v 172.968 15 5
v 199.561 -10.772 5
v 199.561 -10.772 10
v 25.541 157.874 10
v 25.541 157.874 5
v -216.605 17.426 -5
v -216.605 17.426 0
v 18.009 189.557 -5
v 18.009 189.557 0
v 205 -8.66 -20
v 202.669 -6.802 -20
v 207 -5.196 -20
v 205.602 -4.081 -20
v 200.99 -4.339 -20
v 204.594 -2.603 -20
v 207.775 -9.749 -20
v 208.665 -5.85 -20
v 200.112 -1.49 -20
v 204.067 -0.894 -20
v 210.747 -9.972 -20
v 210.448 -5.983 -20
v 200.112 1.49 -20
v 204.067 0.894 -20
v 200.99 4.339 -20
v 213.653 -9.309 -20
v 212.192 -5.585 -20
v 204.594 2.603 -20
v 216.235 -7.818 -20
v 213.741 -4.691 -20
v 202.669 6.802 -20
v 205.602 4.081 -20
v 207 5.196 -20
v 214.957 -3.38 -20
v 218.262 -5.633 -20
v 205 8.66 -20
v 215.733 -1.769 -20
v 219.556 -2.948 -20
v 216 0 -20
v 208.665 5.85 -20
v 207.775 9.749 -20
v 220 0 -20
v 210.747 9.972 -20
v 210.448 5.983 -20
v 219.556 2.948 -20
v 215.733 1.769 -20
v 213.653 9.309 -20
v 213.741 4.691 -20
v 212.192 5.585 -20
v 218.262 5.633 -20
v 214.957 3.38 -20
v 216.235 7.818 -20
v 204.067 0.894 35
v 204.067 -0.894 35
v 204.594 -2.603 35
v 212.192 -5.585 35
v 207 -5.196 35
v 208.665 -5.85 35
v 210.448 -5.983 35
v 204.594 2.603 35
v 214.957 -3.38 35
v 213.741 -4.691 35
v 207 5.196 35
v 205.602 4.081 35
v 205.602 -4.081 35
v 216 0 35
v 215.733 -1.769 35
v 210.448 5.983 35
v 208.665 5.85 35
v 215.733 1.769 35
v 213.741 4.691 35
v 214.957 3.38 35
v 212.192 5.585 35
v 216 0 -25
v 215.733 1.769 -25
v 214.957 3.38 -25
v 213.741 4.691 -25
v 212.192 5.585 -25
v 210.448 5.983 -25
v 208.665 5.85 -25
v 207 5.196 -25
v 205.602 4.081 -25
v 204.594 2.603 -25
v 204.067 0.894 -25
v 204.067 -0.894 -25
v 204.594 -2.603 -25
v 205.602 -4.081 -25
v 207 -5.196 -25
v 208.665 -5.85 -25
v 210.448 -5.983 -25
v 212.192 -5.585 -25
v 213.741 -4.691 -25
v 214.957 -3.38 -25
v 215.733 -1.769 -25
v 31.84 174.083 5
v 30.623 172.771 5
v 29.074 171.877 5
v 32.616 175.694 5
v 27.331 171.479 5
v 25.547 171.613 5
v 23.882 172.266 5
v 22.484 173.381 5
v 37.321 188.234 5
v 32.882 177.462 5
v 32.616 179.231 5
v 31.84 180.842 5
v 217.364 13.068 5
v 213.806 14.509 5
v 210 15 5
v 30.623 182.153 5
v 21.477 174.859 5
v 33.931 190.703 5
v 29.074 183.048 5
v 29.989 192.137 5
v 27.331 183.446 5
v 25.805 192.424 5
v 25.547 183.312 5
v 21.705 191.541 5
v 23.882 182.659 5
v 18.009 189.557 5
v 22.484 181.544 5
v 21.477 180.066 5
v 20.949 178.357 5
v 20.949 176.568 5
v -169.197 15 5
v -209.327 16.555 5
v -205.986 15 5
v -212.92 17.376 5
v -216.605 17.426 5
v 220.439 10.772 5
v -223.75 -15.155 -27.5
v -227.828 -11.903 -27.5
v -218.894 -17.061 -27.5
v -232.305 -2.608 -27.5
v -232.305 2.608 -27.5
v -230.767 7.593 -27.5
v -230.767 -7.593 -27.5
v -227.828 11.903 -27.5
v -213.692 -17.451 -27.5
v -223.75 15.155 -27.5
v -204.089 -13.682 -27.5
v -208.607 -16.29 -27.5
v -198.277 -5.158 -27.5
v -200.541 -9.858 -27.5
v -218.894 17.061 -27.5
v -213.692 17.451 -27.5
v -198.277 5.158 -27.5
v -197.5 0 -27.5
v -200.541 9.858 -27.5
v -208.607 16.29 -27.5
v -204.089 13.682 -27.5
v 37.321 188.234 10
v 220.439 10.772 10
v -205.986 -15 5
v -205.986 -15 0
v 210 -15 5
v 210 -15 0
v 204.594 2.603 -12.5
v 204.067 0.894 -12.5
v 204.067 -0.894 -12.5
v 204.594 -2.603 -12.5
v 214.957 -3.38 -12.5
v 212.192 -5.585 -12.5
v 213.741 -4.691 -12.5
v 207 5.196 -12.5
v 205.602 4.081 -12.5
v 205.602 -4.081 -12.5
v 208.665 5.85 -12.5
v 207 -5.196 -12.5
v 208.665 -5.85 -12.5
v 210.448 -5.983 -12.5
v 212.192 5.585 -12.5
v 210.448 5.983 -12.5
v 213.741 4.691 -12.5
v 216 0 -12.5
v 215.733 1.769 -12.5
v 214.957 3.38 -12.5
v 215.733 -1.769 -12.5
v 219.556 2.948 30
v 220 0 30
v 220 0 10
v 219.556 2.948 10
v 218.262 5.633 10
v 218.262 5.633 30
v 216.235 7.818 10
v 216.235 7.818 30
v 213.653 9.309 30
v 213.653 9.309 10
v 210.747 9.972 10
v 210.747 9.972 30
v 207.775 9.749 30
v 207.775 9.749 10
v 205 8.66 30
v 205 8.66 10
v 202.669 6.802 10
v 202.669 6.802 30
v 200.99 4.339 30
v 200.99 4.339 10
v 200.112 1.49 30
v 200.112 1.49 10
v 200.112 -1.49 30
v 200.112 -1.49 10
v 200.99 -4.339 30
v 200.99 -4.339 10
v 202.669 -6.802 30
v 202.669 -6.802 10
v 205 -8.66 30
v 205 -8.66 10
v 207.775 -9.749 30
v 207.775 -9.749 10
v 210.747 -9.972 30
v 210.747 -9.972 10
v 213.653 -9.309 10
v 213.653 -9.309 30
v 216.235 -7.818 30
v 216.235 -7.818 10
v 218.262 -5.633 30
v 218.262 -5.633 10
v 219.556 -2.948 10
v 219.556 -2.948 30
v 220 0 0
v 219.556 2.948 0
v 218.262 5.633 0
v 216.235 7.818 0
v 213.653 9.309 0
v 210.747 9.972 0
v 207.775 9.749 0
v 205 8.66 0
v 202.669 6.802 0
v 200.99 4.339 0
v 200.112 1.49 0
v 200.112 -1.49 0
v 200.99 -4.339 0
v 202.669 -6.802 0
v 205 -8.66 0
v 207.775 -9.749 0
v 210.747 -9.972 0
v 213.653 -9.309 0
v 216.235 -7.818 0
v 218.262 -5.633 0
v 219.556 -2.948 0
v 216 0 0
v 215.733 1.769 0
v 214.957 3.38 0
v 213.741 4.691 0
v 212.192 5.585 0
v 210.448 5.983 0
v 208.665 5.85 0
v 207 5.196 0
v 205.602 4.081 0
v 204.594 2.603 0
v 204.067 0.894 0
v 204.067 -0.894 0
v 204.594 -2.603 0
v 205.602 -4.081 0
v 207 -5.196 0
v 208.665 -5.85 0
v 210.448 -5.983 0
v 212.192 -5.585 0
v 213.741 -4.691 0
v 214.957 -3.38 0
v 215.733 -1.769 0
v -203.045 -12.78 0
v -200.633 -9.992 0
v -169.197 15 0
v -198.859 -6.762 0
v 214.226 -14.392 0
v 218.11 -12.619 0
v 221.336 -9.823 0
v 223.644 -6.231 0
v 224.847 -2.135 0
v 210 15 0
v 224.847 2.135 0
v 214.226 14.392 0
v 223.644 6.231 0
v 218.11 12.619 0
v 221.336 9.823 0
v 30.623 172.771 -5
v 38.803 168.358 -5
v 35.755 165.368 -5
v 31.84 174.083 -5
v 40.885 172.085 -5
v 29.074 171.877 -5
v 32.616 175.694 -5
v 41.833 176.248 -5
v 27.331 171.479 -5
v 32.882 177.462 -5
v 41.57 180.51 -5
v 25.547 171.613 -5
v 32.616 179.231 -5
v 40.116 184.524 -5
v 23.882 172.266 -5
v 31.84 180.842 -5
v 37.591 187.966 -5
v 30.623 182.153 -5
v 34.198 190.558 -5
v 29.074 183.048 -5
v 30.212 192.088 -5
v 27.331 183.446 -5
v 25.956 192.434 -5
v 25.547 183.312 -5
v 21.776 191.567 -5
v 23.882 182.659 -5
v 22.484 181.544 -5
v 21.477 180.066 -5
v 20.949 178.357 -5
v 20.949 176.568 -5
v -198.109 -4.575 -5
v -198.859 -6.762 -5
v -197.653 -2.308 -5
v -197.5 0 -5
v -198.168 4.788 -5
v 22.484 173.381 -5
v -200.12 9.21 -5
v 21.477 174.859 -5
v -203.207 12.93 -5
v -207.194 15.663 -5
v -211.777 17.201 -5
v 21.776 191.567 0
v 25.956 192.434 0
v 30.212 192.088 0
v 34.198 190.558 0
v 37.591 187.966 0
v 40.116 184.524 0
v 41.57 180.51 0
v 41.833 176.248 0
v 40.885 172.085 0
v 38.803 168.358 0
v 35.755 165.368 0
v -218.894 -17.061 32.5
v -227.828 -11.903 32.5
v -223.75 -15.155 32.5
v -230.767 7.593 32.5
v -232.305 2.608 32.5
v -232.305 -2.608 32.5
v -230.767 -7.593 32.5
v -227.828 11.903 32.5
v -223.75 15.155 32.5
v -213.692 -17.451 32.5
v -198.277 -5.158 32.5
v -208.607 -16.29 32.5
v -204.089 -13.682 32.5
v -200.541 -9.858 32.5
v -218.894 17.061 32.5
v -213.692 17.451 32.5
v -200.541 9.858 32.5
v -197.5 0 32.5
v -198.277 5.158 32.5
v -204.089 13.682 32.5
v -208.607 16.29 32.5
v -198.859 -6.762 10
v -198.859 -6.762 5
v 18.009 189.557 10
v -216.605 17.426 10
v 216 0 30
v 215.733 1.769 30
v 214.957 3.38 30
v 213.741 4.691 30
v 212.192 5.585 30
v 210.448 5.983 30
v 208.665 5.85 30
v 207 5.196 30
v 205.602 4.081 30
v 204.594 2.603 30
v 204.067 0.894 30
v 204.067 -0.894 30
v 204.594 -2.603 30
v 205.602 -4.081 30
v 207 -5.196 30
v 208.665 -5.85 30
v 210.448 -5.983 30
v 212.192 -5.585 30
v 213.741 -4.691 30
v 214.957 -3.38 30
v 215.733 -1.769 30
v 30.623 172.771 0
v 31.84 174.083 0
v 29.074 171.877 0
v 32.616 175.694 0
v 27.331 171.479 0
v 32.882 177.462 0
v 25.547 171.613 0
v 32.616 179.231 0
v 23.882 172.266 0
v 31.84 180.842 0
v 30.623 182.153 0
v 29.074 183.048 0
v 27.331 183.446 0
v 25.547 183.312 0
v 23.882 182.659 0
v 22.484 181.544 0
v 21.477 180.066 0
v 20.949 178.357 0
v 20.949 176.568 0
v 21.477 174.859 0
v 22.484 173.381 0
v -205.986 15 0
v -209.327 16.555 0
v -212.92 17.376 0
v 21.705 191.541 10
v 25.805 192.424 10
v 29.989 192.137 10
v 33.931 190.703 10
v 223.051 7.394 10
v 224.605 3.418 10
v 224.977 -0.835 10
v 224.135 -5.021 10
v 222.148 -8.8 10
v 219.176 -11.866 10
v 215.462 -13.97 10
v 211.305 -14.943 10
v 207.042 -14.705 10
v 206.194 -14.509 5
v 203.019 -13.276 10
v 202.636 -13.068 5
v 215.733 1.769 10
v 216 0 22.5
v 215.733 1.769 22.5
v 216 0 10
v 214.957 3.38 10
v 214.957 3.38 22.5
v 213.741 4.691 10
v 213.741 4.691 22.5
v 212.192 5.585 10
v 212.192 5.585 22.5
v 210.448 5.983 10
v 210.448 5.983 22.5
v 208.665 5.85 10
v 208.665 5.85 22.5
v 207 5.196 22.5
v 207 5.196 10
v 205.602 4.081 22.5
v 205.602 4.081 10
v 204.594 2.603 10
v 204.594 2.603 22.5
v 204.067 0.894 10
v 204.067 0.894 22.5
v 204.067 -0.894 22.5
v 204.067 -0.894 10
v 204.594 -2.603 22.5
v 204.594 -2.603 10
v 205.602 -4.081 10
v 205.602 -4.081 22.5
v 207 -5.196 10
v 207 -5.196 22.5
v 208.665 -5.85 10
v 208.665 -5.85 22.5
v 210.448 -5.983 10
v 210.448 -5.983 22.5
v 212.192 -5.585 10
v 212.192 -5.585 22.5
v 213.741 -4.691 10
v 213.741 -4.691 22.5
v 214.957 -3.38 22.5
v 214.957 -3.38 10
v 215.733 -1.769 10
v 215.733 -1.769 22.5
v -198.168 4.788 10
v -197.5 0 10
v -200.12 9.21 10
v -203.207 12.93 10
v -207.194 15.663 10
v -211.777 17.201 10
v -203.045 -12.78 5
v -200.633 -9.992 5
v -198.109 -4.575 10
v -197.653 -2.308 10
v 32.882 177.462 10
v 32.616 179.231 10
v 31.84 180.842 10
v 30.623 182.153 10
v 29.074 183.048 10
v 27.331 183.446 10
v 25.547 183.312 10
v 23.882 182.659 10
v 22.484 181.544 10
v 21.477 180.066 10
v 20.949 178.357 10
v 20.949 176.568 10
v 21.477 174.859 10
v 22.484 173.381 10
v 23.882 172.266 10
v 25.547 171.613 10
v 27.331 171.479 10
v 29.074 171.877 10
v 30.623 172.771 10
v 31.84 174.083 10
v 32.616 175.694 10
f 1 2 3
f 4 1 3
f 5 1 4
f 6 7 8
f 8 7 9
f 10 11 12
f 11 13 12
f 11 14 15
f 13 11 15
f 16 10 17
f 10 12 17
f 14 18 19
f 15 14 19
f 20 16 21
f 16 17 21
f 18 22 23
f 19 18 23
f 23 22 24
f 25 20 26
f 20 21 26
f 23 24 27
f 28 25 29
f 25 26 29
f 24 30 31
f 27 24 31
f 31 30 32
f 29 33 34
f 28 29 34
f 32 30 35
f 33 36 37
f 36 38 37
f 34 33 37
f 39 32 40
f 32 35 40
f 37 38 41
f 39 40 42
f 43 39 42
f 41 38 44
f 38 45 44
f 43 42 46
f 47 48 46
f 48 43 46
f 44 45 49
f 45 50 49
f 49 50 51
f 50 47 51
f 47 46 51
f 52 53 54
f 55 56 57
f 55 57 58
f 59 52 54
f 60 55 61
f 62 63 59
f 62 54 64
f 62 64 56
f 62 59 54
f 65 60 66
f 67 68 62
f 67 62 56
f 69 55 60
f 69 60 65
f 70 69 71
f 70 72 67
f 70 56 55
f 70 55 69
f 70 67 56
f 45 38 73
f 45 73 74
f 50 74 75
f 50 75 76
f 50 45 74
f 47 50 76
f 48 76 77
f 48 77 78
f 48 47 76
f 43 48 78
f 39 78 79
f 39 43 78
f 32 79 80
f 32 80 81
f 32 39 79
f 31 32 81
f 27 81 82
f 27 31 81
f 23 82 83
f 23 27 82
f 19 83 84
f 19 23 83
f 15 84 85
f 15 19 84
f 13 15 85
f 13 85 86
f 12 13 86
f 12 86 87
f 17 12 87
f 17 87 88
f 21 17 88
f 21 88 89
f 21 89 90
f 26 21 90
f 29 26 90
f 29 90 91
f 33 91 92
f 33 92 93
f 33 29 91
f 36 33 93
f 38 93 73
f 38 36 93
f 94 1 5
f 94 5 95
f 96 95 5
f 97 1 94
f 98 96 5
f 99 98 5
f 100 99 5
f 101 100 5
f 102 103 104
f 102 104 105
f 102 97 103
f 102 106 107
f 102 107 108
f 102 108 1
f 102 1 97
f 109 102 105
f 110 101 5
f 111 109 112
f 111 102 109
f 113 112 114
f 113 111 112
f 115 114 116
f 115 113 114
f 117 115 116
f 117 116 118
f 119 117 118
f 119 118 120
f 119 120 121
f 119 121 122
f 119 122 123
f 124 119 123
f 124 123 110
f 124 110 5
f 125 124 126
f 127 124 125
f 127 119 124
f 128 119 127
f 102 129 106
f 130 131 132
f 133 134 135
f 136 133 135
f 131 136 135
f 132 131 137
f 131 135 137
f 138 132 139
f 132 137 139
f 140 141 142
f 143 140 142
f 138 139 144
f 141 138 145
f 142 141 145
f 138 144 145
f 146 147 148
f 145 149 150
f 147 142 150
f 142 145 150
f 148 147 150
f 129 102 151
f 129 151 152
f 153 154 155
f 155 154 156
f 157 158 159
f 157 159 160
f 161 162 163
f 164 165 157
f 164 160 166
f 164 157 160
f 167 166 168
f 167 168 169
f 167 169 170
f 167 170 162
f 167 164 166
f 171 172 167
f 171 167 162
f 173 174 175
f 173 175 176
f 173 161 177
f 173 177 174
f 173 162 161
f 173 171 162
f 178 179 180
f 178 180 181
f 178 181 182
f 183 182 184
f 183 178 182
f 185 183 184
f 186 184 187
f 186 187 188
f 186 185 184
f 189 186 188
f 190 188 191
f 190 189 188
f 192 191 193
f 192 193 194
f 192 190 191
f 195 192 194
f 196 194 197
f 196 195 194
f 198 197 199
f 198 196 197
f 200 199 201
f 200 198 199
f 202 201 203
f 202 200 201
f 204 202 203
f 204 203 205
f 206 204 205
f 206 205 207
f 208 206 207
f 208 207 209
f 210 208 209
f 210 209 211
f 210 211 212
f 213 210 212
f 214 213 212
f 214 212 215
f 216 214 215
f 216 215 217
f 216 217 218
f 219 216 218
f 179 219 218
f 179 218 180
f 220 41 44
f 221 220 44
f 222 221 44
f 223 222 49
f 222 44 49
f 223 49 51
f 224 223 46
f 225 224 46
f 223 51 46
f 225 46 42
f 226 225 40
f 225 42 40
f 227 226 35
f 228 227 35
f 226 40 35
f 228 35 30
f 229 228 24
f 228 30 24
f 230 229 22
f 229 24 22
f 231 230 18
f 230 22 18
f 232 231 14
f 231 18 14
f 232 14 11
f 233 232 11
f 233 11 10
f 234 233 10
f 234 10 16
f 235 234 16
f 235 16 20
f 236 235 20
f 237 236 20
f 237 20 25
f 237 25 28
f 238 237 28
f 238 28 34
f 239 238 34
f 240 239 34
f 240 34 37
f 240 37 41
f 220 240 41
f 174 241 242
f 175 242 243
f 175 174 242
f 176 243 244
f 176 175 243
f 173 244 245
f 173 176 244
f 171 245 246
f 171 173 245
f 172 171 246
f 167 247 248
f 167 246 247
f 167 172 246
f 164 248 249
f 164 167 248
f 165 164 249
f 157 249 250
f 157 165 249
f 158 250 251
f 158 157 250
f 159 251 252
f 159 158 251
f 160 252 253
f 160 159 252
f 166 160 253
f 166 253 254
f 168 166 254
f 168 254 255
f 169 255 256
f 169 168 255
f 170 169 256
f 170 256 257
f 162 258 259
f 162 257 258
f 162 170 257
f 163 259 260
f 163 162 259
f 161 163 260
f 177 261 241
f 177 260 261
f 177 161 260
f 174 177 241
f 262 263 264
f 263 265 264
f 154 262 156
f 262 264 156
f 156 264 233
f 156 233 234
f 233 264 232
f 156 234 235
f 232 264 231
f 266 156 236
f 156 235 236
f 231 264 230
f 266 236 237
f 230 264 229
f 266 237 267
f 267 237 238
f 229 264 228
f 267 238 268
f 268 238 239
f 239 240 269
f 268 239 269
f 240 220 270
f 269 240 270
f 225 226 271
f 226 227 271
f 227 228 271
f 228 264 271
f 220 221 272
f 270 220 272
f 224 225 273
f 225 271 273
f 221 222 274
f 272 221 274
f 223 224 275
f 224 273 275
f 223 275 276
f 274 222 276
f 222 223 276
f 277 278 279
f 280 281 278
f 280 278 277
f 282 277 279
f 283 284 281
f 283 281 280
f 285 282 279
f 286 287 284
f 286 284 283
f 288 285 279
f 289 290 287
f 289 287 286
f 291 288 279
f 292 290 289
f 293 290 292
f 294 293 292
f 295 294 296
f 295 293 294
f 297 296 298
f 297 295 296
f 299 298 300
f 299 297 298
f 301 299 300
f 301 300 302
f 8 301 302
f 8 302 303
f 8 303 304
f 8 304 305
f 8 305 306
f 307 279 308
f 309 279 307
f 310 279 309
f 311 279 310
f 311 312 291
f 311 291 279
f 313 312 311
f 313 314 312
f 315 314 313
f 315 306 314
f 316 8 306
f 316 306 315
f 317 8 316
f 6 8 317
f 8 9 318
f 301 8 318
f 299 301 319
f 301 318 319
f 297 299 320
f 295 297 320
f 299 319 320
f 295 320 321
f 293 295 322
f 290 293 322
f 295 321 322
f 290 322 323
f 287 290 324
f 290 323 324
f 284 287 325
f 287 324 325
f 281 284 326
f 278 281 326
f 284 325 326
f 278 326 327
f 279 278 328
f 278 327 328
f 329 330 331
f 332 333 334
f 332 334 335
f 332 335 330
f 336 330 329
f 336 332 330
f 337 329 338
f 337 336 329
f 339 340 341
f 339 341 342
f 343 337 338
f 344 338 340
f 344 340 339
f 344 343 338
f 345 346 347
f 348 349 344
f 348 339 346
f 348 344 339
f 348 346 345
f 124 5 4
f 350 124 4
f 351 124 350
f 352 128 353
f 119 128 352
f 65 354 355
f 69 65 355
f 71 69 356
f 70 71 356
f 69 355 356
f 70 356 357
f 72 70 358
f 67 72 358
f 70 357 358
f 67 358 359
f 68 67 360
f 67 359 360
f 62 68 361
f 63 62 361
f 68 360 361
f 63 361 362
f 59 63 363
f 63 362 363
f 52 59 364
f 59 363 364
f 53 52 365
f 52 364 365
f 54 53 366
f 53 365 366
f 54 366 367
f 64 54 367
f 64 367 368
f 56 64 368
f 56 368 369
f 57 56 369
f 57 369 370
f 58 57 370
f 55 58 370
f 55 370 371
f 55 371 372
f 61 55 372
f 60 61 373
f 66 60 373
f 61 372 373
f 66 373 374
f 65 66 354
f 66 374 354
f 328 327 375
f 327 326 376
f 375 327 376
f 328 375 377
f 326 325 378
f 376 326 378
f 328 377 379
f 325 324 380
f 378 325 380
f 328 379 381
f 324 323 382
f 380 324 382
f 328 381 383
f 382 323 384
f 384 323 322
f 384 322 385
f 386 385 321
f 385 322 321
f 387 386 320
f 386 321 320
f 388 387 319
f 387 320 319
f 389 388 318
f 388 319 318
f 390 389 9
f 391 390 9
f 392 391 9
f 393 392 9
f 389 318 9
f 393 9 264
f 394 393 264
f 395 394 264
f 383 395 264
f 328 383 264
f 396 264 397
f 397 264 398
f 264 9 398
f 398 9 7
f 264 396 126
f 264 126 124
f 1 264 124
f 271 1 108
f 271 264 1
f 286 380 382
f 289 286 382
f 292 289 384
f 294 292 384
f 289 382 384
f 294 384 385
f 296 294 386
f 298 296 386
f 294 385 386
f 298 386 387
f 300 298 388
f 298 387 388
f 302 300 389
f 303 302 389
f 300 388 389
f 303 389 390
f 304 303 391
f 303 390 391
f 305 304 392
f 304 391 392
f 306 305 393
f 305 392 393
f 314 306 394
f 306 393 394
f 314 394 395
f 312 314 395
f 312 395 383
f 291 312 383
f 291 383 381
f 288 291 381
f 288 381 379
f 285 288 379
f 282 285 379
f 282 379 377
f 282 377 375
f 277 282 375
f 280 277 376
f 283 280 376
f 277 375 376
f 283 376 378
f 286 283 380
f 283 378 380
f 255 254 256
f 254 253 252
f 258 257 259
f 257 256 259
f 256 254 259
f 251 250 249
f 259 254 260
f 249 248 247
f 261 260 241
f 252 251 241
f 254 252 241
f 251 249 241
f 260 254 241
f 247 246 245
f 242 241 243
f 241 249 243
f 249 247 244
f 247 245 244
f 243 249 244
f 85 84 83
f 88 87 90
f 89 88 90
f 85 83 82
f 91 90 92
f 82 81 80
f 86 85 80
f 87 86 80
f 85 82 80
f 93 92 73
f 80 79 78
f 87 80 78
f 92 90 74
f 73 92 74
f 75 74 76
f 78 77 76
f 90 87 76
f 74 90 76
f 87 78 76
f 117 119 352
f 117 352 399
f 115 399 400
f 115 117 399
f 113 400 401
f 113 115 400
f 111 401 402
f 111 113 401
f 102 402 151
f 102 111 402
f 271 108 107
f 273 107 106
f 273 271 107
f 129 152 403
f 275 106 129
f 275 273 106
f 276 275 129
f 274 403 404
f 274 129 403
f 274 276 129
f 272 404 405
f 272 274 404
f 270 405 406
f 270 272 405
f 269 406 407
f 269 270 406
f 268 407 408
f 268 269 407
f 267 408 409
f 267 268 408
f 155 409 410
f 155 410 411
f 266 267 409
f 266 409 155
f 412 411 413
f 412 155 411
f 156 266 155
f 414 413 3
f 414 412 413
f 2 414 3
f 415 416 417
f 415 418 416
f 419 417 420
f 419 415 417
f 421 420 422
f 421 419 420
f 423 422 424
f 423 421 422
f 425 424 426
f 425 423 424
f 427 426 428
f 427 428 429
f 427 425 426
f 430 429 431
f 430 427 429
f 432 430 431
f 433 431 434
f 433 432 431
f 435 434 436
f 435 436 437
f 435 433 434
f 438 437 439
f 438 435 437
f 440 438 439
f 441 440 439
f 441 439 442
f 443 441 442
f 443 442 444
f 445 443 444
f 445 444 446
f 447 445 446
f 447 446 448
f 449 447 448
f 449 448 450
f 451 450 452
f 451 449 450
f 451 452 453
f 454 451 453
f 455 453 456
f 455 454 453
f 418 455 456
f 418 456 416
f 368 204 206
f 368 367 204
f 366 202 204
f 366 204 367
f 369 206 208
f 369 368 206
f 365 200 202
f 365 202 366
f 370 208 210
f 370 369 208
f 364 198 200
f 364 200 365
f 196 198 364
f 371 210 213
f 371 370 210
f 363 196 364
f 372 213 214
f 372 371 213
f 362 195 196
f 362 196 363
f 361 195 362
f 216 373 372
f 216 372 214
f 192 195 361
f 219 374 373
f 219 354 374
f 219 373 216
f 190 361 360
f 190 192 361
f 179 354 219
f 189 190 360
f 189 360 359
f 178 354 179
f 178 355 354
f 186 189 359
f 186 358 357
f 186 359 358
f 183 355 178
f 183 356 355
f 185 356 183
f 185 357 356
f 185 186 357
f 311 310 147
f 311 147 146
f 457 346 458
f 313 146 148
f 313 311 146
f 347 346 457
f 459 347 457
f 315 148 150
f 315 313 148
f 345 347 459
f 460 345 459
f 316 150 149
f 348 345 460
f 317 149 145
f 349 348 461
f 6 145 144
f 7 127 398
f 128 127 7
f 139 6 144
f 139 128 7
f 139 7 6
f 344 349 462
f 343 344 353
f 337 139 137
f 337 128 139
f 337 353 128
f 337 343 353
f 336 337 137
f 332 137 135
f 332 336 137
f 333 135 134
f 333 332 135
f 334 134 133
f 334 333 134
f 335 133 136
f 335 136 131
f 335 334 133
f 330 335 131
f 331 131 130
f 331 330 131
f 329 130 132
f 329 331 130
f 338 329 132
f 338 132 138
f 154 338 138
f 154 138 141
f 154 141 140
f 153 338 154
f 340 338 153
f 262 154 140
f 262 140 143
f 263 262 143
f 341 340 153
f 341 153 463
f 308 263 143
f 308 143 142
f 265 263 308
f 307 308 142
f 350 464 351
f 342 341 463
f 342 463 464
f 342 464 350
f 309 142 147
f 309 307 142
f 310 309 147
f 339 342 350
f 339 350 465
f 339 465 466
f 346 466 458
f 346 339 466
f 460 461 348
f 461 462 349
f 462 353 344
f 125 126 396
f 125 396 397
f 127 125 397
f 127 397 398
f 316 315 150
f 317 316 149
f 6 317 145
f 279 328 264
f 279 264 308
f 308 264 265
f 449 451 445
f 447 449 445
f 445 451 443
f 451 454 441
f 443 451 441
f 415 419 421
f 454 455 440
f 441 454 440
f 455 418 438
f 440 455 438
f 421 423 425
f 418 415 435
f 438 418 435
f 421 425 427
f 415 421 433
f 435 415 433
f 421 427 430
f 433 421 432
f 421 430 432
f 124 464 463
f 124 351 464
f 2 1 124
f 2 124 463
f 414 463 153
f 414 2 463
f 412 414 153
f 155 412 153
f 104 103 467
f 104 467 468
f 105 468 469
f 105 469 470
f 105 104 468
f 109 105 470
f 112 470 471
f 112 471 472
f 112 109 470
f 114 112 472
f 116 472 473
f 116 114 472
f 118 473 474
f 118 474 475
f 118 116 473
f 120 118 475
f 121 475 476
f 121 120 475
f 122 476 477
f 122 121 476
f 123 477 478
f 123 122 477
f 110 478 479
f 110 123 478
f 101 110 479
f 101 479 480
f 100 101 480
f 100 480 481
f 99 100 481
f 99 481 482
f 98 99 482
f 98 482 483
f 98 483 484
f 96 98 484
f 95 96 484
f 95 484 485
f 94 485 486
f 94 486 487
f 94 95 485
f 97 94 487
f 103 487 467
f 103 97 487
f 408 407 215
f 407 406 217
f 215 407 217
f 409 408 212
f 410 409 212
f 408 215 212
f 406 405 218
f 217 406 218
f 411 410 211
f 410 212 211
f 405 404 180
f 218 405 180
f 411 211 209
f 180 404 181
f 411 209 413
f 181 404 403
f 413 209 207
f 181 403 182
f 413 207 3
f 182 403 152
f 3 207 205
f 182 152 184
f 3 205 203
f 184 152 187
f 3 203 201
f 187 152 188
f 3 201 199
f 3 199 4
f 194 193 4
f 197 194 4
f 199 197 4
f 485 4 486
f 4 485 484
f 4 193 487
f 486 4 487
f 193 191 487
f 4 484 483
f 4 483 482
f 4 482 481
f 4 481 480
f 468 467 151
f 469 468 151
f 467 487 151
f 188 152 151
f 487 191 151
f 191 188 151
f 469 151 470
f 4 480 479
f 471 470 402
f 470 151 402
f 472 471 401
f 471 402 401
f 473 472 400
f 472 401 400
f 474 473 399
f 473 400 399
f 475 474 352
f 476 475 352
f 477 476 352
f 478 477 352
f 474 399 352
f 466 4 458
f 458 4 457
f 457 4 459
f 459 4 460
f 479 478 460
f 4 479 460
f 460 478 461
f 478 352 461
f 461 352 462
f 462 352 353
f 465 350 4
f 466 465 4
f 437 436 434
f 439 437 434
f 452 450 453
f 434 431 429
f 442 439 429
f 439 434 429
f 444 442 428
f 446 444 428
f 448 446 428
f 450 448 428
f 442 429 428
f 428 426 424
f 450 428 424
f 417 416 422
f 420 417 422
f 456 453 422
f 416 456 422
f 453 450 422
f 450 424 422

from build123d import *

# Parameters (mm, degrees)
SKETCH_1_W      = 450
SKETCH_1_H      = 30
EXTRUDE_1_DEPTH = 5
FILLET_1_RADIUS = 15
FILLET_1_LENGTH = 5
FILLET_2_RADIUS = 15
FILLET_2_LENGTH = 5
SKETCH_2_R      = 10
SKETCH_2_R_2    = 6
EXTRUDE_2_DEPTH = 17.5
SKETCH_4_R      = 6
EXTRUDE_3_DEPTH = 5
SKETCH_5_R      = 6
EXTRUDE_4_DEPTH = 5
EXTRUDE_START   = 7.5
SKETCH_6_R      = 10
EXTRUDE_5_DEPTH = 7.5
SKETCH_7_R      = 6
EXTRUDE_6_DEPTH = 5
SKETCH_8_R      = 17.5
EXTRUDE_7_DEPTH = 30


with BuildPart() as part:
    # 草图1 → 凸台-拉伸1 (new body)
    with BuildSketch(Plane.XY):
        Rectangle(SKETCH_1_W, SKETCH_1_H)
    extrude(amount=EXTRUDE_1_DEPTH)

    # 圆角1: full round fillet: the end face becomes a half cylinder, R = half its width
    fillet_1_face = Plane((-225, 0, 2.5), x_dir=(0, 0, 1), z_dir=(-1, 0, 0))  # on the end face: x along it, z out of the body
    fillet_1_slab = fillet_1_face.offset(-FILLET_1_RADIUS / 2) * Box(FILLET_1_LENGTH, 2 * FILLET_1_RADIUS, FILLET_1_RADIUS, mode=Mode.PRIVATE)  # the body's end, R deep
    fillet_1_round = Plane((-210, 0, 2.5), x_dir=(-1, 0, 0), z_dir=(0, 0, 1)) * Cylinder(FILLET_1_RADIUS, FILLET_1_LENGTH, mode=Mode.PRIVATE)  # its axis R under the face
    add(fillet_1_slab - fillet_1_round, mode=Mode.SUBTRACT)

    # 圆角2: full round fillet: the end face becomes a half cylinder, R = half its width
    fillet_2_face = Plane((225, 0, 2.5), x_dir=(0, 0, -1), z_dir=(1, 0, 0))  # on the end face: x along it, z out of the body
    fillet_2_slab = fillet_2_face.offset(-FILLET_2_RADIUS / 2) * Box(FILLET_2_LENGTH, 2 * FILLET_2_RADIUS, FILLET_2_RADIUS, mode=Mode.PRIVATE)  # the body's end, R deep
    fillet_2_round = Plane((210, 0, 2.5), x_dir=(1, 0, 0), z_dir=(0, 0, -1)) * Cylinder(FILLET_2_RADIUS, FILLET_2_LENGTH, mode=Mode.PRIVATE)  # its axis R under the face
    add(fillet_2_slab - fillet_2_round, mode=Mode.SUBTRACT)

    # 草图2 → 凸台-拉伸2 (add, symmetric)
    # profile 1 of 2: a face of its own
    with BuildSketch(Plane.XY.offset(5)):
        with Locations(Location((-215, 0, 0), (0, 0, 180.000443811))):
            Circle(SKETCH_2_R)
        with Locations((-215, 0)):
            Circle(SKETCH_2_R_2, mode=Mode.SUBTRACT)
    # profile 2 of 2: a face of its own
    with BuildSketch(Plane.XY.offset(5)):
        with Locations((210, 0)):
            Circle(SKETCH_2_R)
        with Locations((210, 0)):
            Circle(SKETCH_2_R_2, mode=Mode.SUBTRACT)
    extrude(amount=EXTRUDE_2_DEPTH, both=True)

    # 草图4 → 凸台-拉伸3 (add)
    with BuildSketch(Plane.XY.offset(5)):
        with BuildLine():
            Line((199.561031329, -10.771626298), (16.443384271, 166.690841102))
            ThreePointArc((16.443384271, 166.690841102), (16.110726644, 187.90143607), (37.321321612, 188.234093697))
            Line((37.321321612, 188.234093697), (220.438968671, 10.771626298))
            ThreePointArc((220.438968671, 10.771626298), (220.771626298, -10.438968671), (199.561031329, -10.771626298))
        make_face()
        with Locations((26.882352941, 177.4624674)):
            Circle(SKETCH_4_R, mode=Mode.SUBTRACT)
    extrude(amount=EXTRUDE_3_DEPTH)

    # 草图5 → 凸台-拉伸4 (add)
    with BuildSketch(Plane.XY.offset(5)):
        with BuildLine():
            Line((-223.87312337, 12.094117647), (18.009229571, 189.556585047))
            ThreePointArc((18.009229571, 189.556585047), (38.976470588, 186.33559077), (35.755476311, 165.368349753))
            Line((35.755476311, 165.368349753), (-206.12687663, -12.094117647))
            ThreePointArc((-206.12687663, -12.094117647), (-227.094117647, -8.87312337), (-223.87312337, 12.094117647))
        make_face()
        with Locations((26.882352941, 177.4624674)):
            Circle(SKETCH_5_R, mode=Mode.SUBTRACT)
    extrude_4 = extrude(amount=EXTRUDE_4_DEPTH)

    # 镜向1: 凸台-拉伸4 across plane
    add(extrude_4.mirror(Plane.XY.offset(2.5)))

    # 草图6 → 凸台-拉伸5 (add)
    with BuildSketch(Plane.XY.offset(22.5).offset(EXTRUDE_START)):
        with Locations((210, 0)):
            Circle(SKETCH_6_R)
    extrude_5 = extrude(amount=-EXTRUDE_5_DEPTH)

    # 草图7 → 凸台-拉伸6 (add)
    with BuildSketch(Plane.XY.offset(30)):
        with Locations((210, 0)):
            Circle(SKETCH_7_R)
    extrude_6 = extrude(amount=EXTRUDE_6_DEPTH)

    # 镜向2: 凸台-拉伸5, 凸台-拉伸6 across plane
    add(extrude_5.mirror(Plane.XY.offset(5)))
    add(extrude_6.mirror(Plane.XY.offset(5)))

    # 草图8 → 凸台-拉伸7 (add, symmetric)
    with BuildSketch(Plane.XY.offset(2.5)):
        with Locations((-215, 0)):
            Circle(SKETCH_8_R)
    extrude(amount=EXTRUDE_7_DEPTH, both=True)


solid = part.part
